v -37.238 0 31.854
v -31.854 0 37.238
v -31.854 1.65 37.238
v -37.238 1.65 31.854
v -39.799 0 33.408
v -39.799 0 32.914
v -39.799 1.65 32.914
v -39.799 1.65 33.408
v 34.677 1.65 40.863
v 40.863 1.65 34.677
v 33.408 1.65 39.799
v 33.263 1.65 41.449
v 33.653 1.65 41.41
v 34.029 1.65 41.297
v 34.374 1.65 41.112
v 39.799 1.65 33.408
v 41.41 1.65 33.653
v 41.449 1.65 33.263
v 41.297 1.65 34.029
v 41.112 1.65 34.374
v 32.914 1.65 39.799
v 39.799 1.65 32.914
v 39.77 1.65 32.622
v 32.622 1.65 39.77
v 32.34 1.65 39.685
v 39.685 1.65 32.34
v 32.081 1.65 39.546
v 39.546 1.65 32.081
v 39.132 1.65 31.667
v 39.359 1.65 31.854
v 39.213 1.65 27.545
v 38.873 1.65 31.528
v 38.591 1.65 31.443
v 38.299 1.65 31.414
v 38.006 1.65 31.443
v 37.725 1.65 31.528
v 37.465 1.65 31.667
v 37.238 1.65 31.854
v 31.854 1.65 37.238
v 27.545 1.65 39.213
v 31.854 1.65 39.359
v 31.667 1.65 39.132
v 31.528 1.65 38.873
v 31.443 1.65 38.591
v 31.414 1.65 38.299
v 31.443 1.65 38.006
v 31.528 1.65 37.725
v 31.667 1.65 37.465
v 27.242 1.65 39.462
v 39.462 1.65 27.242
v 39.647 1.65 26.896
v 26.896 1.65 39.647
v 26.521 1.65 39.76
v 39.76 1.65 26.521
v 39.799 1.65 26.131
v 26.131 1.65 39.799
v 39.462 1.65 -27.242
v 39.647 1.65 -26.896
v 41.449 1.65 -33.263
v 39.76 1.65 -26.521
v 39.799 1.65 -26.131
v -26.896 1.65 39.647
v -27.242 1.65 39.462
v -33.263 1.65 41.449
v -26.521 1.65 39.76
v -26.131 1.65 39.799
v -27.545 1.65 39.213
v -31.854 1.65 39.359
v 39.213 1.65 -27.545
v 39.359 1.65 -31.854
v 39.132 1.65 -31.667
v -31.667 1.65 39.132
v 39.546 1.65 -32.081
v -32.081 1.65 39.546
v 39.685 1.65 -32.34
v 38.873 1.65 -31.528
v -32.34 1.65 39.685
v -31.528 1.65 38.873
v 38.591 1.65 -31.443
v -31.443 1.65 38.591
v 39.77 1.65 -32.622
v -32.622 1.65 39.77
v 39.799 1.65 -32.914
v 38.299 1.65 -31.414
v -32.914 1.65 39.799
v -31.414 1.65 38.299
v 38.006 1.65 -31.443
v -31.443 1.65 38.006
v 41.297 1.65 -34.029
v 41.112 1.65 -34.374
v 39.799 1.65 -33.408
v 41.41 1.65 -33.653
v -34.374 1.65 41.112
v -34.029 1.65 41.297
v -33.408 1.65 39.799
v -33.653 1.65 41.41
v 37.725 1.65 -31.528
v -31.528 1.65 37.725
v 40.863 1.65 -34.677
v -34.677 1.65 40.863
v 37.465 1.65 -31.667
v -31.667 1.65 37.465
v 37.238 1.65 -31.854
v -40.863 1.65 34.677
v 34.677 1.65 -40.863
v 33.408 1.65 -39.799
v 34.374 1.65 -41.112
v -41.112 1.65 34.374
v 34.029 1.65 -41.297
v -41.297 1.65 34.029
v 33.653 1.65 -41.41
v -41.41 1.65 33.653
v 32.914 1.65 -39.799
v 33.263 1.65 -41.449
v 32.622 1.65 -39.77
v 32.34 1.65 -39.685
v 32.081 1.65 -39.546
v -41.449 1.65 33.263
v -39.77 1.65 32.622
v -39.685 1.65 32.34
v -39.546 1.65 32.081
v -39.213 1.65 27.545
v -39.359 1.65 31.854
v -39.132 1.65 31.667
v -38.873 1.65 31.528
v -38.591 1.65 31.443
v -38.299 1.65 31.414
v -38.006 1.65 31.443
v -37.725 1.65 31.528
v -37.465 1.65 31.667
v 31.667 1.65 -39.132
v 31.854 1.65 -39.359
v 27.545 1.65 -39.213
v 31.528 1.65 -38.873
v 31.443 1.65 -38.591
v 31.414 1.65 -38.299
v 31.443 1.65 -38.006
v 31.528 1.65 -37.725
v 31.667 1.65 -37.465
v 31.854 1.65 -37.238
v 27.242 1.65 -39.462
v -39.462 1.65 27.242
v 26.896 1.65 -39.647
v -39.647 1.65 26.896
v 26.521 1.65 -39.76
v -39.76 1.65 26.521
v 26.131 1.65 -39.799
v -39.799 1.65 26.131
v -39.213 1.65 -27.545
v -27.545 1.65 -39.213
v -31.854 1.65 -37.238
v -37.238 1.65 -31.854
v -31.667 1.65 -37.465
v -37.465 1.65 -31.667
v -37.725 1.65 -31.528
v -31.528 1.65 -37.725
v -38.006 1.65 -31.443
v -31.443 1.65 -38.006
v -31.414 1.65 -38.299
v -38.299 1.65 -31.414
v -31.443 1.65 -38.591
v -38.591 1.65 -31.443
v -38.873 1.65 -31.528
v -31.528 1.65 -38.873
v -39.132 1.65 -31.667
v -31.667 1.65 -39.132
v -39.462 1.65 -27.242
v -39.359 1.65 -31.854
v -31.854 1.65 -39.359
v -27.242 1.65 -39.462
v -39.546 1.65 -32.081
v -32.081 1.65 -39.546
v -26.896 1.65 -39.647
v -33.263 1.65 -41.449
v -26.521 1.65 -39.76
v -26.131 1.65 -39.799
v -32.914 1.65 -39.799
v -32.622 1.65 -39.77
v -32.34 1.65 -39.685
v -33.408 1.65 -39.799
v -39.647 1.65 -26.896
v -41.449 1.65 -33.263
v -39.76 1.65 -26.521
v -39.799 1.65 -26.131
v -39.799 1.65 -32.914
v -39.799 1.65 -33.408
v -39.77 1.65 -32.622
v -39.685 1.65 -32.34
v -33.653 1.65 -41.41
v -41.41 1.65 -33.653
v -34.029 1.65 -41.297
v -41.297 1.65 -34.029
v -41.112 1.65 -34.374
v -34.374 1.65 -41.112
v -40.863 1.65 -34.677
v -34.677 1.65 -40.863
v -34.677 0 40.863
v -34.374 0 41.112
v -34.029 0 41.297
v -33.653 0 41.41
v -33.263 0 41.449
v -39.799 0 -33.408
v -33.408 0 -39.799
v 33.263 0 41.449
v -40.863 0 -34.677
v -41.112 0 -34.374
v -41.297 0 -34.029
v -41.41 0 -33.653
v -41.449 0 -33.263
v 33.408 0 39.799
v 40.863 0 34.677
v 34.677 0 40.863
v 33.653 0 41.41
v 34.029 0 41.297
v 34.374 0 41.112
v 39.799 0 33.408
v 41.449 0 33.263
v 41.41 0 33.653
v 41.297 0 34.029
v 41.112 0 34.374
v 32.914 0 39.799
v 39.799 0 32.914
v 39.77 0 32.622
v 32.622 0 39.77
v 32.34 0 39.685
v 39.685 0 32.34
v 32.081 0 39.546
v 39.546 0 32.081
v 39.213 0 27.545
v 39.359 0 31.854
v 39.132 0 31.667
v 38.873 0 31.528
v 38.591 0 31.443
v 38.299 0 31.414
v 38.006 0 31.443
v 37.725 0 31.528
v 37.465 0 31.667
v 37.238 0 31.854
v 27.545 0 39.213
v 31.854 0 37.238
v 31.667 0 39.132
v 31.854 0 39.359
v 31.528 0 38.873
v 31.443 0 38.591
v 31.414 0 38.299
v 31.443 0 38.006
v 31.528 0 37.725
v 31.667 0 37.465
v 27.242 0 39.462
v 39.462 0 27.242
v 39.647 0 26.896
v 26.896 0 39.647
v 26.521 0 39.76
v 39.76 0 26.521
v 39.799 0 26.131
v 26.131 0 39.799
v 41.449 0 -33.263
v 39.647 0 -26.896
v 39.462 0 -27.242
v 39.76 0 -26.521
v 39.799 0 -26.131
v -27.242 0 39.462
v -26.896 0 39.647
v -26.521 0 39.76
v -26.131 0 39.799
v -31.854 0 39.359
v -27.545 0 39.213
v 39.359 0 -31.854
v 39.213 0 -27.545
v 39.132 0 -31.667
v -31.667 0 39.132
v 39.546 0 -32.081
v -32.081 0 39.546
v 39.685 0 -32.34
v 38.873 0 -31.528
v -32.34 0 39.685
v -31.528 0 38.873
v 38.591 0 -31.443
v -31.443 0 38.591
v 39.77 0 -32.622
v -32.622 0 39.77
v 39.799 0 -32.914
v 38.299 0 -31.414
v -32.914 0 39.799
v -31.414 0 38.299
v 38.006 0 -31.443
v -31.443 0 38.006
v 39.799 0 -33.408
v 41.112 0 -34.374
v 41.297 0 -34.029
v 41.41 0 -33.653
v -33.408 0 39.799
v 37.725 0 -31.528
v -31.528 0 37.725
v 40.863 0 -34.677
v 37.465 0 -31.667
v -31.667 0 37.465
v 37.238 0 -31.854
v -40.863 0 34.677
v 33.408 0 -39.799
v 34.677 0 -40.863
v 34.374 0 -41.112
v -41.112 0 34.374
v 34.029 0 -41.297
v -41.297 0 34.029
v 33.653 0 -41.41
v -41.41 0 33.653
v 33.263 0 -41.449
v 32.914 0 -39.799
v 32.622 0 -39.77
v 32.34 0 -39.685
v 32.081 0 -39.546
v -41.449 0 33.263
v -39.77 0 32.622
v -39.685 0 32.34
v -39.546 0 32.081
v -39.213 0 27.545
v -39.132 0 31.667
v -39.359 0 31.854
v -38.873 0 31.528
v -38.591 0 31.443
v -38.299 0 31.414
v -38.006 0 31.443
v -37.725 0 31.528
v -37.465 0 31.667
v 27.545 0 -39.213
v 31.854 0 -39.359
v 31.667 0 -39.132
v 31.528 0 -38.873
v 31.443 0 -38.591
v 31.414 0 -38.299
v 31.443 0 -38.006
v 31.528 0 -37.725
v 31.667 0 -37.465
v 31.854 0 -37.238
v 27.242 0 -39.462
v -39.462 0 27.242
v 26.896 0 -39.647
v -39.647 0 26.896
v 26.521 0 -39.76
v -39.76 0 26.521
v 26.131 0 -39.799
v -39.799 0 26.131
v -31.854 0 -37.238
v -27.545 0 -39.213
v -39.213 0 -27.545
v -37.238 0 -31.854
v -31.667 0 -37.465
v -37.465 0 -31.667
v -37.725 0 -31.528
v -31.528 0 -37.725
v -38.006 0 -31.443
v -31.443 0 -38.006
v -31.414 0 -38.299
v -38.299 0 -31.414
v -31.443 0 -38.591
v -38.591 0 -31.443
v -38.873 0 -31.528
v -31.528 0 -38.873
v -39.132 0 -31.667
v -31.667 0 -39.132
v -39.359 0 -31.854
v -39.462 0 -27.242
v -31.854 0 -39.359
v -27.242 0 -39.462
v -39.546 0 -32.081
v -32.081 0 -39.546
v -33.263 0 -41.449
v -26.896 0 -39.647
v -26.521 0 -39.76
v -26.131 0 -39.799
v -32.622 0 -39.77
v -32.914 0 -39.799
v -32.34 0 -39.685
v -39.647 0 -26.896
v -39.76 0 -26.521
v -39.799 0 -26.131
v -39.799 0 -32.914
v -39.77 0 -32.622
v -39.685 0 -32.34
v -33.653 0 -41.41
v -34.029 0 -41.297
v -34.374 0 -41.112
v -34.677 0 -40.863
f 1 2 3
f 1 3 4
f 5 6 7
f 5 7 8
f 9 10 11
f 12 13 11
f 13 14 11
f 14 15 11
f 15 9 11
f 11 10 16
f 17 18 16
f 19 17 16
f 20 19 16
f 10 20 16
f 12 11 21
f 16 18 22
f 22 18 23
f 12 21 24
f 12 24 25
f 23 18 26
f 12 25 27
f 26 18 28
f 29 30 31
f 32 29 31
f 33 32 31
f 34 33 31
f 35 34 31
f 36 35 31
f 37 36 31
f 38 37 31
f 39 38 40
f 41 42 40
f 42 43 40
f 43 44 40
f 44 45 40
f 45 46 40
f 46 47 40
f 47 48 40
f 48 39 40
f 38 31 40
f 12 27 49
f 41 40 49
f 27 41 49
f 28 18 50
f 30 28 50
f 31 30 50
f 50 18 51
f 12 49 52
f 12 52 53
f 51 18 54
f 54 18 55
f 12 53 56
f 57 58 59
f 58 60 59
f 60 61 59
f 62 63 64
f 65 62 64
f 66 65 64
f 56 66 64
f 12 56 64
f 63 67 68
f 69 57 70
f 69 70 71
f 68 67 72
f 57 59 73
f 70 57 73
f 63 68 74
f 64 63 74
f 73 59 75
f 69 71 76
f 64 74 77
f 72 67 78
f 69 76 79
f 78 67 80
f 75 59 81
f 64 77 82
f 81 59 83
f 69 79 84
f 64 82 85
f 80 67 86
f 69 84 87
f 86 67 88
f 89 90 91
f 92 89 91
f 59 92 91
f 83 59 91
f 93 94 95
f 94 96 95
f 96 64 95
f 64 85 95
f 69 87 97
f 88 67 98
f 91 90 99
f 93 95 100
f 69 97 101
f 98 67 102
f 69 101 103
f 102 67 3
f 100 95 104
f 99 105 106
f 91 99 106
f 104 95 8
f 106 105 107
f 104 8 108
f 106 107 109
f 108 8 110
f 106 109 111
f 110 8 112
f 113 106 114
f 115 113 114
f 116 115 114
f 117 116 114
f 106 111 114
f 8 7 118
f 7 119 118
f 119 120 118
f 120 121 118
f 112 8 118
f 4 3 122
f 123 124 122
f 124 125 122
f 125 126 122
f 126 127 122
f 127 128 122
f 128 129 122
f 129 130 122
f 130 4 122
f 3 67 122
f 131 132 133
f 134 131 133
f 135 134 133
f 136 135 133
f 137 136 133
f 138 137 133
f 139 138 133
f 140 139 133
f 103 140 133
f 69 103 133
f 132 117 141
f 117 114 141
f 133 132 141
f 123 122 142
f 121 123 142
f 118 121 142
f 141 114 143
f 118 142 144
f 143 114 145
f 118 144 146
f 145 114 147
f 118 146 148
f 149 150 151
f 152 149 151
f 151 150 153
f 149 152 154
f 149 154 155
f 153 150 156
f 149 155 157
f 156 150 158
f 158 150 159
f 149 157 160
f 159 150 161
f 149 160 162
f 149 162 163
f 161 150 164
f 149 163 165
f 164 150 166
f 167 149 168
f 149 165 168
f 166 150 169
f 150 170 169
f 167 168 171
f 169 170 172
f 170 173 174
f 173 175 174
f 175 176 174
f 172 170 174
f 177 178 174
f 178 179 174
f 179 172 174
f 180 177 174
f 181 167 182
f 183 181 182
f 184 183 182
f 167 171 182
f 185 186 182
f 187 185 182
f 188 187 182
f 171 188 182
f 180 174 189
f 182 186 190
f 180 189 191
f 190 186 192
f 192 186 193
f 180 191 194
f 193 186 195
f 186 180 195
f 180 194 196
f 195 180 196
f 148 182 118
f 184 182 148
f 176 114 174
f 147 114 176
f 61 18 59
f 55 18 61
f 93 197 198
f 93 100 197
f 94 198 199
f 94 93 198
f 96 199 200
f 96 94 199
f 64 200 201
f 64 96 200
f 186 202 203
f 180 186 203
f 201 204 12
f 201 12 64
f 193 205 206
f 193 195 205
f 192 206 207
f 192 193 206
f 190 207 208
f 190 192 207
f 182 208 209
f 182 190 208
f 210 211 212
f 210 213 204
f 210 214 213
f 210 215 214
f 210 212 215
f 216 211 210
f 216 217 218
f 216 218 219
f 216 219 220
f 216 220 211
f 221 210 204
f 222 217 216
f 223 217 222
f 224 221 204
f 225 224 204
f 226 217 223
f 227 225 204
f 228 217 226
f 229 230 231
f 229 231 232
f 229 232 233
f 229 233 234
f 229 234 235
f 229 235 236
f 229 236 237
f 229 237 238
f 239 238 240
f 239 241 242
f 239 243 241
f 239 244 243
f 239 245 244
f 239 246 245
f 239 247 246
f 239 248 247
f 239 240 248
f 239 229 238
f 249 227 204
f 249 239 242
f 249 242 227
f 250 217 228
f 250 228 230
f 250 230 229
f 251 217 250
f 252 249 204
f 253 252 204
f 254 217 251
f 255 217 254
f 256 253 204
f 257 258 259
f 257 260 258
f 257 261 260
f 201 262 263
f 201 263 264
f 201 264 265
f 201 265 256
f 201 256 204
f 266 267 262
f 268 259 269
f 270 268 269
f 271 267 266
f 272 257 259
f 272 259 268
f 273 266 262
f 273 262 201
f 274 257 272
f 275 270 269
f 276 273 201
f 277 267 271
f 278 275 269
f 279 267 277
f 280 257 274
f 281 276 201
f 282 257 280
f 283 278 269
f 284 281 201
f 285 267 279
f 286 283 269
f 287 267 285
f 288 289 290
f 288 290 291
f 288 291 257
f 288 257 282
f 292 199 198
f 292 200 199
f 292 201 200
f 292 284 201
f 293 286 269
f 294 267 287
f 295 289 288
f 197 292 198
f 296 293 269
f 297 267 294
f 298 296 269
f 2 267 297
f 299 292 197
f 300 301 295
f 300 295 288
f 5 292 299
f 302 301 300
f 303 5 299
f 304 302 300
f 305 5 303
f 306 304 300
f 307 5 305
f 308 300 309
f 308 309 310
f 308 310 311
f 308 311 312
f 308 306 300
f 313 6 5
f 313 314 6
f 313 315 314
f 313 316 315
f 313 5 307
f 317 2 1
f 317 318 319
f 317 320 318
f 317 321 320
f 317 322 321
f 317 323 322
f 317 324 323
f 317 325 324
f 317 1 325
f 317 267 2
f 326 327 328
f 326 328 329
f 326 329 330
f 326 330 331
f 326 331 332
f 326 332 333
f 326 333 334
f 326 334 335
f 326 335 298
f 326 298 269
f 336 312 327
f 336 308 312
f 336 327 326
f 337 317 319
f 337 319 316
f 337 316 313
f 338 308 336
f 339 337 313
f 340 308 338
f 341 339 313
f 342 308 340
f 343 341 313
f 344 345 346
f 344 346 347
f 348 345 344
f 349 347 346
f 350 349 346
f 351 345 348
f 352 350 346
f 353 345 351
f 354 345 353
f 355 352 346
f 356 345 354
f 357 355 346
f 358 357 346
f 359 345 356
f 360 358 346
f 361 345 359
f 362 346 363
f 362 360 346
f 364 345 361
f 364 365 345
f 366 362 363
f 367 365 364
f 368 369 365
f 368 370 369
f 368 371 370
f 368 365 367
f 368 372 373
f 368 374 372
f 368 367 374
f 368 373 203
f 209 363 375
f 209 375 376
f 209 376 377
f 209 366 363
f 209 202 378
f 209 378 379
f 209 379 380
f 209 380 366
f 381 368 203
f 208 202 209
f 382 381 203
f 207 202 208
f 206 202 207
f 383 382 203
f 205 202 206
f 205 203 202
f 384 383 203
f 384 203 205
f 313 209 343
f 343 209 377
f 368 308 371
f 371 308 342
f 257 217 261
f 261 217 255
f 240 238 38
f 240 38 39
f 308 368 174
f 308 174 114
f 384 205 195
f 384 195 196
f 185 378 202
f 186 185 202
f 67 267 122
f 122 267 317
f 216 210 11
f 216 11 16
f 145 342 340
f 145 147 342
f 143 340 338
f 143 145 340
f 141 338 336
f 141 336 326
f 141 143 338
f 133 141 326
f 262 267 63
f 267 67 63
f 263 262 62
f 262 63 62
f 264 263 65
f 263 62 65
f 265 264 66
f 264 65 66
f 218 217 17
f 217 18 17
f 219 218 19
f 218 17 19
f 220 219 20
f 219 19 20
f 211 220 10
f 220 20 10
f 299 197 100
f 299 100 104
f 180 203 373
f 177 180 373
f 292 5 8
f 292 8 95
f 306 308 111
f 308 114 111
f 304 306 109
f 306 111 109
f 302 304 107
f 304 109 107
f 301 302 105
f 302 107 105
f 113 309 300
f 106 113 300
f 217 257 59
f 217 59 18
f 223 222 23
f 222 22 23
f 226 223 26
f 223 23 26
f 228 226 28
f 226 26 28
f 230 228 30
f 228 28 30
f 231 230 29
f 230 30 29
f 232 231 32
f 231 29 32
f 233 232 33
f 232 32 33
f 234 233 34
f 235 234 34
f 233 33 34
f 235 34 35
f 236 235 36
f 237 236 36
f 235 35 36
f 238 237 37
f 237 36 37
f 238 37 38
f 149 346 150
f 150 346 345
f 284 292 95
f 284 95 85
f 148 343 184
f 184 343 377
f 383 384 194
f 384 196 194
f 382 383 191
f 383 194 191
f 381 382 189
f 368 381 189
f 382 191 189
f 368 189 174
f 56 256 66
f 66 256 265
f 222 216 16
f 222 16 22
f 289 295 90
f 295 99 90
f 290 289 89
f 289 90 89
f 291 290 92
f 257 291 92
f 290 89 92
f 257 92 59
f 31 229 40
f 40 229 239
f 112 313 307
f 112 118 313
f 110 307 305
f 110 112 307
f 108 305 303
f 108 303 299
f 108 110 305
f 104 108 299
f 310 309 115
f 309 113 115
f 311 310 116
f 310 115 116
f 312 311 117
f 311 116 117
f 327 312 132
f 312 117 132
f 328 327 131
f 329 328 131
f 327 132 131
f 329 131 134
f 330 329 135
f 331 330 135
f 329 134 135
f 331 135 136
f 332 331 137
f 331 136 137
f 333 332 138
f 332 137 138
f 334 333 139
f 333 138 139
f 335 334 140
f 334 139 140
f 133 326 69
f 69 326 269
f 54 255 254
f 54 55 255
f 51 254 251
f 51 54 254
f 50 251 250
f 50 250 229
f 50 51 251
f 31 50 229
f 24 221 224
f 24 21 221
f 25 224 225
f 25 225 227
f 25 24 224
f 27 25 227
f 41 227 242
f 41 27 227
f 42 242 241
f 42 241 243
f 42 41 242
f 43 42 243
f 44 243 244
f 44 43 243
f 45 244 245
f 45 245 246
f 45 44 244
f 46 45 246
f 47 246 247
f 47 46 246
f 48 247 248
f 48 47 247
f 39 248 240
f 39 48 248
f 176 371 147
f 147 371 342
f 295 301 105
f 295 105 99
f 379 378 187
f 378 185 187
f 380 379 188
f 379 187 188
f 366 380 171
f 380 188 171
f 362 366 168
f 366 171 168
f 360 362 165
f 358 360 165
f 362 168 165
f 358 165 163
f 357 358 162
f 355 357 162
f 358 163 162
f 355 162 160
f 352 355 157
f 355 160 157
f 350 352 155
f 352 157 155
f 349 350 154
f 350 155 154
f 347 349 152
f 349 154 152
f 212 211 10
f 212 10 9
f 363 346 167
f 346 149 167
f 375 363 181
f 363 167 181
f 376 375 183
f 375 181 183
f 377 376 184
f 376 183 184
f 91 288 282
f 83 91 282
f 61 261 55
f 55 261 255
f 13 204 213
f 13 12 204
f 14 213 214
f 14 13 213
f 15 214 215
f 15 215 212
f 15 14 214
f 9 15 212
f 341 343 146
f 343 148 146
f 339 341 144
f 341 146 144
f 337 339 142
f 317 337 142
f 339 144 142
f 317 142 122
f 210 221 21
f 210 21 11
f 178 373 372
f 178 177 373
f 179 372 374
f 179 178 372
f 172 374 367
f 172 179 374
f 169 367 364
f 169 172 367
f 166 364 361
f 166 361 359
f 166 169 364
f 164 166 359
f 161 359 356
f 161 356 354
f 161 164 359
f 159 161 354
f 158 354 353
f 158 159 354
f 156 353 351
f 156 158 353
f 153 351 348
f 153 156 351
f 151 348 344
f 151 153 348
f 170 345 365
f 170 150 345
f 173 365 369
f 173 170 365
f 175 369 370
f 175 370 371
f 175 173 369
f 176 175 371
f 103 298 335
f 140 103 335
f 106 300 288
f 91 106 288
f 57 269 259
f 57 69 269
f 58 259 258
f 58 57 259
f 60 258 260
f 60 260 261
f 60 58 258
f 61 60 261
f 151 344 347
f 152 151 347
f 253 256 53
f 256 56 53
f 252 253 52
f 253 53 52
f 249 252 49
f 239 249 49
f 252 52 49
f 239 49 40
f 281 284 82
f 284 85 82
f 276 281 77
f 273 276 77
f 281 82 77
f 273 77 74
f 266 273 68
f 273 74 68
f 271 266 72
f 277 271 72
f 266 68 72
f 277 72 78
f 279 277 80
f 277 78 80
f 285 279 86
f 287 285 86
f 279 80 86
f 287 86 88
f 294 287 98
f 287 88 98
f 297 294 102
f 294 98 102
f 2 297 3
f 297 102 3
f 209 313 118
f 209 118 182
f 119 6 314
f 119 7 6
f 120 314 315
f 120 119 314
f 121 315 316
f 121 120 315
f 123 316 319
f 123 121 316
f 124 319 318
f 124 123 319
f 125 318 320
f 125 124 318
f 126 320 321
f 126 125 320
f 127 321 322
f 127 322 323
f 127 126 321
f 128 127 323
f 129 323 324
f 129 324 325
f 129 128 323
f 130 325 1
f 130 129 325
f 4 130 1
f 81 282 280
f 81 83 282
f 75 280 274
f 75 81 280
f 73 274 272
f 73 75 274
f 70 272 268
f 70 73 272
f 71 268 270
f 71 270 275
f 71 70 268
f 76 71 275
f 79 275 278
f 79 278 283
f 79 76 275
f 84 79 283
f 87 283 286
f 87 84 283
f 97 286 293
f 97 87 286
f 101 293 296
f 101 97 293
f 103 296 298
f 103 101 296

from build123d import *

# Parameters (mm, degrees)
BOSS_EXTRUDE1_DEPTH = 1.65
FILLET1_R           = 2
FILLET2_R           = 2
FILLET3_R           = 1.5


with BuildPart() as part:
    # Sketch1 → Boss-Extrude1 (new body)
    with BuildSketch(Plane(origin=(0, 0, 0), x_dir=(1, 0, 0), z_dir=(0, 1, 0))):
        Polygon((-41.448800006, 34.091704203), (-34.091704203, 41.448800006), (34.091704203, 41.448800006), (41.448800006, 34.091704203), (41.448800006, -34.091704203), (34.091704203, -41.448800006), (-34.091704203, -41.448800006), (-41.448800006, -34.091704203), align=None)
        Polygon((-39.798800006, 33.408251825), (-33.408251825, 39.798800006), (-29.292890359, 39.798800006), (-39.798800006, 29.292890359), align=None, mode=Mode.SUBTRACT)
        Polygon((-33.408251825, -39.798800006), (-29.292890359, -39.798800006), (-39.798800006, -29.292890359), (-39.798800006, -33.408251825), align=None, mode=Mode.SUBTRACT)
        Polygon((39.798800006, -33.408251825), (39.798800006, -29.292890359), (29.292890359, -39.798800006), (33.408251825, -39.798800006), align=None, mode=Mode.SUBTRACT)
        Polygon((33.408251825, 39.798800006), (39.798800006, 33.408251825), (39.798800006, 29.292890359), (29.292890359, 39.798800006), align=None, mode=Mode.SUBTRACT)
        Polygon((-39.798800006, 26.959437981), (-26.959437981, 39.798800006), (26.959437981, 39.798800006), (39.798800006, 26.959437981), (39.798800006, -26.959437981), (26.959437981, -39.798800006), (-26.959437981, -39.798800006), (-39.798800006, -26.959437981), align=None, mode=Mode.SUBTRACT)
    extrude(amount=BOSS_EXTRUDE1_DEPTH)

    # Fillet1
    fillet1_edges = [part.edges().sort_by_distance(p)[0] for p in [
        (-41.448800006, 0.825, -34.091704203),
        (-34.091704203, 0.825, -41.448800006),
        (-39.798800006, 0.825, -26.959437981),
        (-26.959437981, 0.825, -39.798800006),
    ]]
    fillet(fillet1_edges, radius=FILLET1_R)

    # Fillet2
    fillet2_edges = [part.edges().sort_by_distance(p)[0] for p in [
        (34.091704203, 0.825, -41.448800006),
        (41.448800006, 0.825, -34.091704203),
        (41.448800006, 0.825, 34.091704203),
        (34.091704203, 0.825, 41.448800006),
        (-34.091704203, 0.825, 41.448800006),
        (-41.448800006, 0.825, 34.091704203),
        (-39.798800006, 0.825, 26.959437981),
        (-26.959437981, 0.825, 39.798800006),
        (26.959437981, 0.825, 39.798800006),
        (39.798800006, 0.825, 26.959437981),
        (39.798800006, 0.825, -26.959437981),
        (26.959437981, 0.825, -39.798800006),
    ]]
    fillet(fillet2_edges, radius=FILLET2_R)

    # Fillet3
    fillet3_edges = [part.edges().sort_by_distance(p)[0] for p in [
        (-39.798800006, 0.825, -29.292890359),
        (-29.292890359, 0.825, -39.798800006),
        (29.292890359, 0.825, -39.798800006),
        (39.798800006, 0.825, -29.292890359),
        (39.798800006, 0.825, 29.292890359),
        (29.292890359, 0.825, 39.798800006),
        (-29.292890359, 0.825, 39.798800006),
        (-39.798800006, 0.825, 29.292890359),
    ]]
    fillet(fillet3_edges, radius=FILLET3_R)


solid = part.part
